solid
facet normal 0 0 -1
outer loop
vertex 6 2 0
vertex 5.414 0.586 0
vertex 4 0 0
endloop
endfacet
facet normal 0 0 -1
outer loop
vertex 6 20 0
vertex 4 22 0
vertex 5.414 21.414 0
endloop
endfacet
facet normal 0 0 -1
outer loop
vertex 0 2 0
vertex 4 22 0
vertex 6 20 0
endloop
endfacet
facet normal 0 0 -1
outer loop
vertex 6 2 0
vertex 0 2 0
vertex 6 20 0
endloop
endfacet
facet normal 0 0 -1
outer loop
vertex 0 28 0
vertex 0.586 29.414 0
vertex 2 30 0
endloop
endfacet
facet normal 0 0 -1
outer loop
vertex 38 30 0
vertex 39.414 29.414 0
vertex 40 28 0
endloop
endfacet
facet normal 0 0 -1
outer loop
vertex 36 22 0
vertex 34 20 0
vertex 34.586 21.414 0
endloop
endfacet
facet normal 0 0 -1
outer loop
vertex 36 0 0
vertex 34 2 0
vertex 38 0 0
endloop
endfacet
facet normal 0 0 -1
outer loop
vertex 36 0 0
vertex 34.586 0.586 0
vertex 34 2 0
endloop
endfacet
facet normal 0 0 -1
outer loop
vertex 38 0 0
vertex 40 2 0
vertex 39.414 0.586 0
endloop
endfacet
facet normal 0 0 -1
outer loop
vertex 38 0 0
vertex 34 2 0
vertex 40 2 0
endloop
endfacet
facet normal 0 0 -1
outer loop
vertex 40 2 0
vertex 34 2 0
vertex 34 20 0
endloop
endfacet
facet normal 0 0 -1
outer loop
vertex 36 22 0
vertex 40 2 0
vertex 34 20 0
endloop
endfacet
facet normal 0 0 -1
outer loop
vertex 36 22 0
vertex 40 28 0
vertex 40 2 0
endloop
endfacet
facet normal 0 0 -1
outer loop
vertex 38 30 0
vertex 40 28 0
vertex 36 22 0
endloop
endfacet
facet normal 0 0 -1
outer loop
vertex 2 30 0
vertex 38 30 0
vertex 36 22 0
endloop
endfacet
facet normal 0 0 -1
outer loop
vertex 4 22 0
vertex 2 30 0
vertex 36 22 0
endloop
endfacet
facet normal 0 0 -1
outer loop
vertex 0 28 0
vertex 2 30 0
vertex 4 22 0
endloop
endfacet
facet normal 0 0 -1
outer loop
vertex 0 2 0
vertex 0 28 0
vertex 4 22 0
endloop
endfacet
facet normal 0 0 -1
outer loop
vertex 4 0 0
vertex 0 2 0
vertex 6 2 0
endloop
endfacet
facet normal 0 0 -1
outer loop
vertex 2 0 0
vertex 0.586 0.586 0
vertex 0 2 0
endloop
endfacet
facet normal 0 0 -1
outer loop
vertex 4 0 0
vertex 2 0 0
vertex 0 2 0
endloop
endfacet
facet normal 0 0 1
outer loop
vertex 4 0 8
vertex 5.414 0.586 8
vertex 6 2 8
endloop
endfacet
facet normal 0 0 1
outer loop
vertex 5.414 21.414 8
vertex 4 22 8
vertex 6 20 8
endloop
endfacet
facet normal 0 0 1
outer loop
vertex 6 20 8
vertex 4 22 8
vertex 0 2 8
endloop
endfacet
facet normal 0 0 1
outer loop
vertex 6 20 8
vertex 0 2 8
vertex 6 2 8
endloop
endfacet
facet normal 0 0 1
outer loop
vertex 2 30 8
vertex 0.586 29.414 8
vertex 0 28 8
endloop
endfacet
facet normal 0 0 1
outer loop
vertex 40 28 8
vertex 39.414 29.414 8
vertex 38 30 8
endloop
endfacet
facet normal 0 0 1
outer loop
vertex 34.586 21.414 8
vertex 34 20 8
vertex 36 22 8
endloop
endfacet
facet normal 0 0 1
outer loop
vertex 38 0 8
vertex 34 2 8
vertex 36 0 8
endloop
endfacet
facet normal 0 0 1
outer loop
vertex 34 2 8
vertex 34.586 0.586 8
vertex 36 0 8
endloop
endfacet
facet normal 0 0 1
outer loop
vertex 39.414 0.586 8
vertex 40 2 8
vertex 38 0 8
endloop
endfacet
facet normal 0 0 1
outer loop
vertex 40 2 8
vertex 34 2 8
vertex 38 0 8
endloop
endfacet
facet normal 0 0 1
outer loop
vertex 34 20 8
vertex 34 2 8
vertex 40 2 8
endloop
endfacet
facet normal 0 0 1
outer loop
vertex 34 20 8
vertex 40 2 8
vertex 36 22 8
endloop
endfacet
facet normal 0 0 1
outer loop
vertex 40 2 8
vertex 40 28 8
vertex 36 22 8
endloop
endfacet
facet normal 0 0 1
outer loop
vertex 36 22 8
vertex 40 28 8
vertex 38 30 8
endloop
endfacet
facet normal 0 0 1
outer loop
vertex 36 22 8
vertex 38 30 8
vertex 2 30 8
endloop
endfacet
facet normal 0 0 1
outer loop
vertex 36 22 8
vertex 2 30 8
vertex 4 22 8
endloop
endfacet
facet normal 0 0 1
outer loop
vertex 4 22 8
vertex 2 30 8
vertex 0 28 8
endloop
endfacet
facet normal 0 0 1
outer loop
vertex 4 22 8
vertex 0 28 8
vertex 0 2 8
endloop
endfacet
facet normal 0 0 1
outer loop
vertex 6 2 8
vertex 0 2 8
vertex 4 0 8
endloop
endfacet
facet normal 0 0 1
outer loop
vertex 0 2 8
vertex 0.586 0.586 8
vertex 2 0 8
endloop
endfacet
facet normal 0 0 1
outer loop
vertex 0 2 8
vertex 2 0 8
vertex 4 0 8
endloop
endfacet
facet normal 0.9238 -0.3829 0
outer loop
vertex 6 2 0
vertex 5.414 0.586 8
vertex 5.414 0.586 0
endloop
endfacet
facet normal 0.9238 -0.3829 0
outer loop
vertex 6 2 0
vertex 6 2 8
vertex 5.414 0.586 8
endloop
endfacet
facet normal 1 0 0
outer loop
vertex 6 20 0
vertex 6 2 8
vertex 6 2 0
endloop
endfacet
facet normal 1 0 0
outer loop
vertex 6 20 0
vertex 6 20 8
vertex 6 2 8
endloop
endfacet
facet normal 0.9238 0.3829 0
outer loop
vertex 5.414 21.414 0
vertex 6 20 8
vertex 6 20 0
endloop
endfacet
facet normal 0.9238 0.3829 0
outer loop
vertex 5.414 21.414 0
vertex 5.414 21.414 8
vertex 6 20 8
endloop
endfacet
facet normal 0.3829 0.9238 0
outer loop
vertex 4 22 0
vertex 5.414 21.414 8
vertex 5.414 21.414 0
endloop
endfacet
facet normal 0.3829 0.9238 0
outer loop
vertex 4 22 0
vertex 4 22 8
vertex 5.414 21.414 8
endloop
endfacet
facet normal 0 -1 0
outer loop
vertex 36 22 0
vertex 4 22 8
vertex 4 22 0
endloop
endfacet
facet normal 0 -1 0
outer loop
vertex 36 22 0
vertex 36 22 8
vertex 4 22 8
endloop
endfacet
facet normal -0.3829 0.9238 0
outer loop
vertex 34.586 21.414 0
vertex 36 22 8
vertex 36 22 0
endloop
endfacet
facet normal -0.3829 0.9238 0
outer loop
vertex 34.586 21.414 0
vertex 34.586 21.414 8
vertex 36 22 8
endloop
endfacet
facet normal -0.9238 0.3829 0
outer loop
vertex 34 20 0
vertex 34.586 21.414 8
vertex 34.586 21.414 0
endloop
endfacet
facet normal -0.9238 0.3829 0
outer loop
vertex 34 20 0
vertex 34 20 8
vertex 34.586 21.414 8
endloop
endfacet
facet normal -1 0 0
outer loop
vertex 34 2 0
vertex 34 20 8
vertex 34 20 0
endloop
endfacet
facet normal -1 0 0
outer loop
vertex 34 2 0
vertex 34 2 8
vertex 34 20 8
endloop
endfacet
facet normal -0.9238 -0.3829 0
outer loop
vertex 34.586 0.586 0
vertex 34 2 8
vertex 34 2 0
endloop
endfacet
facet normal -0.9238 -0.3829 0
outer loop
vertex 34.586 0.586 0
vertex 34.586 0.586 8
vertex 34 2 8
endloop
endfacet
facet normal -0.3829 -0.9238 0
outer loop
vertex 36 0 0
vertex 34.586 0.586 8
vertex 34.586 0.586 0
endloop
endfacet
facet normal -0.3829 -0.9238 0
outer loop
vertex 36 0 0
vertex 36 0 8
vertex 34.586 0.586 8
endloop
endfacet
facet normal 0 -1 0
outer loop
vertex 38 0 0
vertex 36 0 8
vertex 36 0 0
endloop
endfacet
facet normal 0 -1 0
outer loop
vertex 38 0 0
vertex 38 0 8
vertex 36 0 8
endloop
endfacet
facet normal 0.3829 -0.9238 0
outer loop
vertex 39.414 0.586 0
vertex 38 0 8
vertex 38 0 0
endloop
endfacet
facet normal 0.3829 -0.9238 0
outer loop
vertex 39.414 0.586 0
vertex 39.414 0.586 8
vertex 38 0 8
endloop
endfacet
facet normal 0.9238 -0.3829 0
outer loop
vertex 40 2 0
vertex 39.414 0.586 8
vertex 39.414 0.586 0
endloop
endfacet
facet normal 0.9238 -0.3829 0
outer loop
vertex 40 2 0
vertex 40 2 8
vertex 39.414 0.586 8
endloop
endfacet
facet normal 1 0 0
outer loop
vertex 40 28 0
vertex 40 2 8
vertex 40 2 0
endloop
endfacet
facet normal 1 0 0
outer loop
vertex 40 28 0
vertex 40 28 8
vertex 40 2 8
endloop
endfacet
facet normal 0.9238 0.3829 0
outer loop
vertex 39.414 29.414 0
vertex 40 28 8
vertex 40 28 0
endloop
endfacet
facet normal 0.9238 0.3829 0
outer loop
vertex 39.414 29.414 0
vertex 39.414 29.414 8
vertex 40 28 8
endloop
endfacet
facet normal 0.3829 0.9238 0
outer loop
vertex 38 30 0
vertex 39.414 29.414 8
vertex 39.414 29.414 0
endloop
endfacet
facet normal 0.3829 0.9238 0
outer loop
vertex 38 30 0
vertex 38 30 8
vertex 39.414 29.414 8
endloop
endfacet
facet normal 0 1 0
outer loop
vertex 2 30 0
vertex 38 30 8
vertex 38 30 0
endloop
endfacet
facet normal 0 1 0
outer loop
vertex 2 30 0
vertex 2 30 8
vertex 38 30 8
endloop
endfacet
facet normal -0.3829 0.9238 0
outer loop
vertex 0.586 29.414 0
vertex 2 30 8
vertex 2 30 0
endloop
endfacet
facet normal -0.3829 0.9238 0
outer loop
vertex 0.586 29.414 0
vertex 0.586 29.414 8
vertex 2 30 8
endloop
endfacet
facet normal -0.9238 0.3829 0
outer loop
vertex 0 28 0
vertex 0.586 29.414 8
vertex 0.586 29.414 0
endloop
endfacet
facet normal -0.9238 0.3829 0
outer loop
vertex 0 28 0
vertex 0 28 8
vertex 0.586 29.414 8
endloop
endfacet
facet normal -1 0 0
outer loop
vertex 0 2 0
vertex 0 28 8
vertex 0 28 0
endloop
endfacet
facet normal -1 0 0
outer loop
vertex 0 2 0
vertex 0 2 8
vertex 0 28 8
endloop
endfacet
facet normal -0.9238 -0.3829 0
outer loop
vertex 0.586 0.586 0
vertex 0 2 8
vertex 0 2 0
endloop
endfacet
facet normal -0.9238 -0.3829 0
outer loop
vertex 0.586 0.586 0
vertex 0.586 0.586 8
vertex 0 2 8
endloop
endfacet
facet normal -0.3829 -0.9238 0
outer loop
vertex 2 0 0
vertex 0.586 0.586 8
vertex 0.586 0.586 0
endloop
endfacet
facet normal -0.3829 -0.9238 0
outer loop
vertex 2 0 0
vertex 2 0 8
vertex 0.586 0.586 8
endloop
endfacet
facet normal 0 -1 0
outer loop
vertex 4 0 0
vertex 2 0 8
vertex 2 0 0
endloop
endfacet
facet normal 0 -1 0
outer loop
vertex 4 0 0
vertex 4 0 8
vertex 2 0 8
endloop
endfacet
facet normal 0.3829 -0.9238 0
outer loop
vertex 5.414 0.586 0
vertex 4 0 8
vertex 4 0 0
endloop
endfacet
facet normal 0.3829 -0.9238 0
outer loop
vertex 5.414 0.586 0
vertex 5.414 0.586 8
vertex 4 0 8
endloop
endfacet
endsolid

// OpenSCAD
$fn = 32;

// ----------------------------------------------------------------------
// Clip blank: staple clip, 8 mm thick
// ----------------------------------------------------------------------

// --- parameters (mm) ---
profile_height = 8;       // extrusion height
profile_points = 24;      // points of the closed outline

profile = [[0, 2], [0.586, 0.586], [2, 0], [4, 0], [5.414, 0.586], [6, 2], [6, 20], [5.414, 21.414], [4, 22], [36, 22], [34.586, 21.414], [34, 20], [34, 2], [34.586, 0.586], [36, 0], [38, 0], [39.414, 0.586], [40, 2], [40, 28], [39.414, 29.414], [38, 30], [2, 30], [0.586, 29.414], [0, 28]];  // single closed polygon, 24 points, counter clockwise

// --- the one profile operation ---
linear_extrude(height = profile_height) polygon(points = profile);
